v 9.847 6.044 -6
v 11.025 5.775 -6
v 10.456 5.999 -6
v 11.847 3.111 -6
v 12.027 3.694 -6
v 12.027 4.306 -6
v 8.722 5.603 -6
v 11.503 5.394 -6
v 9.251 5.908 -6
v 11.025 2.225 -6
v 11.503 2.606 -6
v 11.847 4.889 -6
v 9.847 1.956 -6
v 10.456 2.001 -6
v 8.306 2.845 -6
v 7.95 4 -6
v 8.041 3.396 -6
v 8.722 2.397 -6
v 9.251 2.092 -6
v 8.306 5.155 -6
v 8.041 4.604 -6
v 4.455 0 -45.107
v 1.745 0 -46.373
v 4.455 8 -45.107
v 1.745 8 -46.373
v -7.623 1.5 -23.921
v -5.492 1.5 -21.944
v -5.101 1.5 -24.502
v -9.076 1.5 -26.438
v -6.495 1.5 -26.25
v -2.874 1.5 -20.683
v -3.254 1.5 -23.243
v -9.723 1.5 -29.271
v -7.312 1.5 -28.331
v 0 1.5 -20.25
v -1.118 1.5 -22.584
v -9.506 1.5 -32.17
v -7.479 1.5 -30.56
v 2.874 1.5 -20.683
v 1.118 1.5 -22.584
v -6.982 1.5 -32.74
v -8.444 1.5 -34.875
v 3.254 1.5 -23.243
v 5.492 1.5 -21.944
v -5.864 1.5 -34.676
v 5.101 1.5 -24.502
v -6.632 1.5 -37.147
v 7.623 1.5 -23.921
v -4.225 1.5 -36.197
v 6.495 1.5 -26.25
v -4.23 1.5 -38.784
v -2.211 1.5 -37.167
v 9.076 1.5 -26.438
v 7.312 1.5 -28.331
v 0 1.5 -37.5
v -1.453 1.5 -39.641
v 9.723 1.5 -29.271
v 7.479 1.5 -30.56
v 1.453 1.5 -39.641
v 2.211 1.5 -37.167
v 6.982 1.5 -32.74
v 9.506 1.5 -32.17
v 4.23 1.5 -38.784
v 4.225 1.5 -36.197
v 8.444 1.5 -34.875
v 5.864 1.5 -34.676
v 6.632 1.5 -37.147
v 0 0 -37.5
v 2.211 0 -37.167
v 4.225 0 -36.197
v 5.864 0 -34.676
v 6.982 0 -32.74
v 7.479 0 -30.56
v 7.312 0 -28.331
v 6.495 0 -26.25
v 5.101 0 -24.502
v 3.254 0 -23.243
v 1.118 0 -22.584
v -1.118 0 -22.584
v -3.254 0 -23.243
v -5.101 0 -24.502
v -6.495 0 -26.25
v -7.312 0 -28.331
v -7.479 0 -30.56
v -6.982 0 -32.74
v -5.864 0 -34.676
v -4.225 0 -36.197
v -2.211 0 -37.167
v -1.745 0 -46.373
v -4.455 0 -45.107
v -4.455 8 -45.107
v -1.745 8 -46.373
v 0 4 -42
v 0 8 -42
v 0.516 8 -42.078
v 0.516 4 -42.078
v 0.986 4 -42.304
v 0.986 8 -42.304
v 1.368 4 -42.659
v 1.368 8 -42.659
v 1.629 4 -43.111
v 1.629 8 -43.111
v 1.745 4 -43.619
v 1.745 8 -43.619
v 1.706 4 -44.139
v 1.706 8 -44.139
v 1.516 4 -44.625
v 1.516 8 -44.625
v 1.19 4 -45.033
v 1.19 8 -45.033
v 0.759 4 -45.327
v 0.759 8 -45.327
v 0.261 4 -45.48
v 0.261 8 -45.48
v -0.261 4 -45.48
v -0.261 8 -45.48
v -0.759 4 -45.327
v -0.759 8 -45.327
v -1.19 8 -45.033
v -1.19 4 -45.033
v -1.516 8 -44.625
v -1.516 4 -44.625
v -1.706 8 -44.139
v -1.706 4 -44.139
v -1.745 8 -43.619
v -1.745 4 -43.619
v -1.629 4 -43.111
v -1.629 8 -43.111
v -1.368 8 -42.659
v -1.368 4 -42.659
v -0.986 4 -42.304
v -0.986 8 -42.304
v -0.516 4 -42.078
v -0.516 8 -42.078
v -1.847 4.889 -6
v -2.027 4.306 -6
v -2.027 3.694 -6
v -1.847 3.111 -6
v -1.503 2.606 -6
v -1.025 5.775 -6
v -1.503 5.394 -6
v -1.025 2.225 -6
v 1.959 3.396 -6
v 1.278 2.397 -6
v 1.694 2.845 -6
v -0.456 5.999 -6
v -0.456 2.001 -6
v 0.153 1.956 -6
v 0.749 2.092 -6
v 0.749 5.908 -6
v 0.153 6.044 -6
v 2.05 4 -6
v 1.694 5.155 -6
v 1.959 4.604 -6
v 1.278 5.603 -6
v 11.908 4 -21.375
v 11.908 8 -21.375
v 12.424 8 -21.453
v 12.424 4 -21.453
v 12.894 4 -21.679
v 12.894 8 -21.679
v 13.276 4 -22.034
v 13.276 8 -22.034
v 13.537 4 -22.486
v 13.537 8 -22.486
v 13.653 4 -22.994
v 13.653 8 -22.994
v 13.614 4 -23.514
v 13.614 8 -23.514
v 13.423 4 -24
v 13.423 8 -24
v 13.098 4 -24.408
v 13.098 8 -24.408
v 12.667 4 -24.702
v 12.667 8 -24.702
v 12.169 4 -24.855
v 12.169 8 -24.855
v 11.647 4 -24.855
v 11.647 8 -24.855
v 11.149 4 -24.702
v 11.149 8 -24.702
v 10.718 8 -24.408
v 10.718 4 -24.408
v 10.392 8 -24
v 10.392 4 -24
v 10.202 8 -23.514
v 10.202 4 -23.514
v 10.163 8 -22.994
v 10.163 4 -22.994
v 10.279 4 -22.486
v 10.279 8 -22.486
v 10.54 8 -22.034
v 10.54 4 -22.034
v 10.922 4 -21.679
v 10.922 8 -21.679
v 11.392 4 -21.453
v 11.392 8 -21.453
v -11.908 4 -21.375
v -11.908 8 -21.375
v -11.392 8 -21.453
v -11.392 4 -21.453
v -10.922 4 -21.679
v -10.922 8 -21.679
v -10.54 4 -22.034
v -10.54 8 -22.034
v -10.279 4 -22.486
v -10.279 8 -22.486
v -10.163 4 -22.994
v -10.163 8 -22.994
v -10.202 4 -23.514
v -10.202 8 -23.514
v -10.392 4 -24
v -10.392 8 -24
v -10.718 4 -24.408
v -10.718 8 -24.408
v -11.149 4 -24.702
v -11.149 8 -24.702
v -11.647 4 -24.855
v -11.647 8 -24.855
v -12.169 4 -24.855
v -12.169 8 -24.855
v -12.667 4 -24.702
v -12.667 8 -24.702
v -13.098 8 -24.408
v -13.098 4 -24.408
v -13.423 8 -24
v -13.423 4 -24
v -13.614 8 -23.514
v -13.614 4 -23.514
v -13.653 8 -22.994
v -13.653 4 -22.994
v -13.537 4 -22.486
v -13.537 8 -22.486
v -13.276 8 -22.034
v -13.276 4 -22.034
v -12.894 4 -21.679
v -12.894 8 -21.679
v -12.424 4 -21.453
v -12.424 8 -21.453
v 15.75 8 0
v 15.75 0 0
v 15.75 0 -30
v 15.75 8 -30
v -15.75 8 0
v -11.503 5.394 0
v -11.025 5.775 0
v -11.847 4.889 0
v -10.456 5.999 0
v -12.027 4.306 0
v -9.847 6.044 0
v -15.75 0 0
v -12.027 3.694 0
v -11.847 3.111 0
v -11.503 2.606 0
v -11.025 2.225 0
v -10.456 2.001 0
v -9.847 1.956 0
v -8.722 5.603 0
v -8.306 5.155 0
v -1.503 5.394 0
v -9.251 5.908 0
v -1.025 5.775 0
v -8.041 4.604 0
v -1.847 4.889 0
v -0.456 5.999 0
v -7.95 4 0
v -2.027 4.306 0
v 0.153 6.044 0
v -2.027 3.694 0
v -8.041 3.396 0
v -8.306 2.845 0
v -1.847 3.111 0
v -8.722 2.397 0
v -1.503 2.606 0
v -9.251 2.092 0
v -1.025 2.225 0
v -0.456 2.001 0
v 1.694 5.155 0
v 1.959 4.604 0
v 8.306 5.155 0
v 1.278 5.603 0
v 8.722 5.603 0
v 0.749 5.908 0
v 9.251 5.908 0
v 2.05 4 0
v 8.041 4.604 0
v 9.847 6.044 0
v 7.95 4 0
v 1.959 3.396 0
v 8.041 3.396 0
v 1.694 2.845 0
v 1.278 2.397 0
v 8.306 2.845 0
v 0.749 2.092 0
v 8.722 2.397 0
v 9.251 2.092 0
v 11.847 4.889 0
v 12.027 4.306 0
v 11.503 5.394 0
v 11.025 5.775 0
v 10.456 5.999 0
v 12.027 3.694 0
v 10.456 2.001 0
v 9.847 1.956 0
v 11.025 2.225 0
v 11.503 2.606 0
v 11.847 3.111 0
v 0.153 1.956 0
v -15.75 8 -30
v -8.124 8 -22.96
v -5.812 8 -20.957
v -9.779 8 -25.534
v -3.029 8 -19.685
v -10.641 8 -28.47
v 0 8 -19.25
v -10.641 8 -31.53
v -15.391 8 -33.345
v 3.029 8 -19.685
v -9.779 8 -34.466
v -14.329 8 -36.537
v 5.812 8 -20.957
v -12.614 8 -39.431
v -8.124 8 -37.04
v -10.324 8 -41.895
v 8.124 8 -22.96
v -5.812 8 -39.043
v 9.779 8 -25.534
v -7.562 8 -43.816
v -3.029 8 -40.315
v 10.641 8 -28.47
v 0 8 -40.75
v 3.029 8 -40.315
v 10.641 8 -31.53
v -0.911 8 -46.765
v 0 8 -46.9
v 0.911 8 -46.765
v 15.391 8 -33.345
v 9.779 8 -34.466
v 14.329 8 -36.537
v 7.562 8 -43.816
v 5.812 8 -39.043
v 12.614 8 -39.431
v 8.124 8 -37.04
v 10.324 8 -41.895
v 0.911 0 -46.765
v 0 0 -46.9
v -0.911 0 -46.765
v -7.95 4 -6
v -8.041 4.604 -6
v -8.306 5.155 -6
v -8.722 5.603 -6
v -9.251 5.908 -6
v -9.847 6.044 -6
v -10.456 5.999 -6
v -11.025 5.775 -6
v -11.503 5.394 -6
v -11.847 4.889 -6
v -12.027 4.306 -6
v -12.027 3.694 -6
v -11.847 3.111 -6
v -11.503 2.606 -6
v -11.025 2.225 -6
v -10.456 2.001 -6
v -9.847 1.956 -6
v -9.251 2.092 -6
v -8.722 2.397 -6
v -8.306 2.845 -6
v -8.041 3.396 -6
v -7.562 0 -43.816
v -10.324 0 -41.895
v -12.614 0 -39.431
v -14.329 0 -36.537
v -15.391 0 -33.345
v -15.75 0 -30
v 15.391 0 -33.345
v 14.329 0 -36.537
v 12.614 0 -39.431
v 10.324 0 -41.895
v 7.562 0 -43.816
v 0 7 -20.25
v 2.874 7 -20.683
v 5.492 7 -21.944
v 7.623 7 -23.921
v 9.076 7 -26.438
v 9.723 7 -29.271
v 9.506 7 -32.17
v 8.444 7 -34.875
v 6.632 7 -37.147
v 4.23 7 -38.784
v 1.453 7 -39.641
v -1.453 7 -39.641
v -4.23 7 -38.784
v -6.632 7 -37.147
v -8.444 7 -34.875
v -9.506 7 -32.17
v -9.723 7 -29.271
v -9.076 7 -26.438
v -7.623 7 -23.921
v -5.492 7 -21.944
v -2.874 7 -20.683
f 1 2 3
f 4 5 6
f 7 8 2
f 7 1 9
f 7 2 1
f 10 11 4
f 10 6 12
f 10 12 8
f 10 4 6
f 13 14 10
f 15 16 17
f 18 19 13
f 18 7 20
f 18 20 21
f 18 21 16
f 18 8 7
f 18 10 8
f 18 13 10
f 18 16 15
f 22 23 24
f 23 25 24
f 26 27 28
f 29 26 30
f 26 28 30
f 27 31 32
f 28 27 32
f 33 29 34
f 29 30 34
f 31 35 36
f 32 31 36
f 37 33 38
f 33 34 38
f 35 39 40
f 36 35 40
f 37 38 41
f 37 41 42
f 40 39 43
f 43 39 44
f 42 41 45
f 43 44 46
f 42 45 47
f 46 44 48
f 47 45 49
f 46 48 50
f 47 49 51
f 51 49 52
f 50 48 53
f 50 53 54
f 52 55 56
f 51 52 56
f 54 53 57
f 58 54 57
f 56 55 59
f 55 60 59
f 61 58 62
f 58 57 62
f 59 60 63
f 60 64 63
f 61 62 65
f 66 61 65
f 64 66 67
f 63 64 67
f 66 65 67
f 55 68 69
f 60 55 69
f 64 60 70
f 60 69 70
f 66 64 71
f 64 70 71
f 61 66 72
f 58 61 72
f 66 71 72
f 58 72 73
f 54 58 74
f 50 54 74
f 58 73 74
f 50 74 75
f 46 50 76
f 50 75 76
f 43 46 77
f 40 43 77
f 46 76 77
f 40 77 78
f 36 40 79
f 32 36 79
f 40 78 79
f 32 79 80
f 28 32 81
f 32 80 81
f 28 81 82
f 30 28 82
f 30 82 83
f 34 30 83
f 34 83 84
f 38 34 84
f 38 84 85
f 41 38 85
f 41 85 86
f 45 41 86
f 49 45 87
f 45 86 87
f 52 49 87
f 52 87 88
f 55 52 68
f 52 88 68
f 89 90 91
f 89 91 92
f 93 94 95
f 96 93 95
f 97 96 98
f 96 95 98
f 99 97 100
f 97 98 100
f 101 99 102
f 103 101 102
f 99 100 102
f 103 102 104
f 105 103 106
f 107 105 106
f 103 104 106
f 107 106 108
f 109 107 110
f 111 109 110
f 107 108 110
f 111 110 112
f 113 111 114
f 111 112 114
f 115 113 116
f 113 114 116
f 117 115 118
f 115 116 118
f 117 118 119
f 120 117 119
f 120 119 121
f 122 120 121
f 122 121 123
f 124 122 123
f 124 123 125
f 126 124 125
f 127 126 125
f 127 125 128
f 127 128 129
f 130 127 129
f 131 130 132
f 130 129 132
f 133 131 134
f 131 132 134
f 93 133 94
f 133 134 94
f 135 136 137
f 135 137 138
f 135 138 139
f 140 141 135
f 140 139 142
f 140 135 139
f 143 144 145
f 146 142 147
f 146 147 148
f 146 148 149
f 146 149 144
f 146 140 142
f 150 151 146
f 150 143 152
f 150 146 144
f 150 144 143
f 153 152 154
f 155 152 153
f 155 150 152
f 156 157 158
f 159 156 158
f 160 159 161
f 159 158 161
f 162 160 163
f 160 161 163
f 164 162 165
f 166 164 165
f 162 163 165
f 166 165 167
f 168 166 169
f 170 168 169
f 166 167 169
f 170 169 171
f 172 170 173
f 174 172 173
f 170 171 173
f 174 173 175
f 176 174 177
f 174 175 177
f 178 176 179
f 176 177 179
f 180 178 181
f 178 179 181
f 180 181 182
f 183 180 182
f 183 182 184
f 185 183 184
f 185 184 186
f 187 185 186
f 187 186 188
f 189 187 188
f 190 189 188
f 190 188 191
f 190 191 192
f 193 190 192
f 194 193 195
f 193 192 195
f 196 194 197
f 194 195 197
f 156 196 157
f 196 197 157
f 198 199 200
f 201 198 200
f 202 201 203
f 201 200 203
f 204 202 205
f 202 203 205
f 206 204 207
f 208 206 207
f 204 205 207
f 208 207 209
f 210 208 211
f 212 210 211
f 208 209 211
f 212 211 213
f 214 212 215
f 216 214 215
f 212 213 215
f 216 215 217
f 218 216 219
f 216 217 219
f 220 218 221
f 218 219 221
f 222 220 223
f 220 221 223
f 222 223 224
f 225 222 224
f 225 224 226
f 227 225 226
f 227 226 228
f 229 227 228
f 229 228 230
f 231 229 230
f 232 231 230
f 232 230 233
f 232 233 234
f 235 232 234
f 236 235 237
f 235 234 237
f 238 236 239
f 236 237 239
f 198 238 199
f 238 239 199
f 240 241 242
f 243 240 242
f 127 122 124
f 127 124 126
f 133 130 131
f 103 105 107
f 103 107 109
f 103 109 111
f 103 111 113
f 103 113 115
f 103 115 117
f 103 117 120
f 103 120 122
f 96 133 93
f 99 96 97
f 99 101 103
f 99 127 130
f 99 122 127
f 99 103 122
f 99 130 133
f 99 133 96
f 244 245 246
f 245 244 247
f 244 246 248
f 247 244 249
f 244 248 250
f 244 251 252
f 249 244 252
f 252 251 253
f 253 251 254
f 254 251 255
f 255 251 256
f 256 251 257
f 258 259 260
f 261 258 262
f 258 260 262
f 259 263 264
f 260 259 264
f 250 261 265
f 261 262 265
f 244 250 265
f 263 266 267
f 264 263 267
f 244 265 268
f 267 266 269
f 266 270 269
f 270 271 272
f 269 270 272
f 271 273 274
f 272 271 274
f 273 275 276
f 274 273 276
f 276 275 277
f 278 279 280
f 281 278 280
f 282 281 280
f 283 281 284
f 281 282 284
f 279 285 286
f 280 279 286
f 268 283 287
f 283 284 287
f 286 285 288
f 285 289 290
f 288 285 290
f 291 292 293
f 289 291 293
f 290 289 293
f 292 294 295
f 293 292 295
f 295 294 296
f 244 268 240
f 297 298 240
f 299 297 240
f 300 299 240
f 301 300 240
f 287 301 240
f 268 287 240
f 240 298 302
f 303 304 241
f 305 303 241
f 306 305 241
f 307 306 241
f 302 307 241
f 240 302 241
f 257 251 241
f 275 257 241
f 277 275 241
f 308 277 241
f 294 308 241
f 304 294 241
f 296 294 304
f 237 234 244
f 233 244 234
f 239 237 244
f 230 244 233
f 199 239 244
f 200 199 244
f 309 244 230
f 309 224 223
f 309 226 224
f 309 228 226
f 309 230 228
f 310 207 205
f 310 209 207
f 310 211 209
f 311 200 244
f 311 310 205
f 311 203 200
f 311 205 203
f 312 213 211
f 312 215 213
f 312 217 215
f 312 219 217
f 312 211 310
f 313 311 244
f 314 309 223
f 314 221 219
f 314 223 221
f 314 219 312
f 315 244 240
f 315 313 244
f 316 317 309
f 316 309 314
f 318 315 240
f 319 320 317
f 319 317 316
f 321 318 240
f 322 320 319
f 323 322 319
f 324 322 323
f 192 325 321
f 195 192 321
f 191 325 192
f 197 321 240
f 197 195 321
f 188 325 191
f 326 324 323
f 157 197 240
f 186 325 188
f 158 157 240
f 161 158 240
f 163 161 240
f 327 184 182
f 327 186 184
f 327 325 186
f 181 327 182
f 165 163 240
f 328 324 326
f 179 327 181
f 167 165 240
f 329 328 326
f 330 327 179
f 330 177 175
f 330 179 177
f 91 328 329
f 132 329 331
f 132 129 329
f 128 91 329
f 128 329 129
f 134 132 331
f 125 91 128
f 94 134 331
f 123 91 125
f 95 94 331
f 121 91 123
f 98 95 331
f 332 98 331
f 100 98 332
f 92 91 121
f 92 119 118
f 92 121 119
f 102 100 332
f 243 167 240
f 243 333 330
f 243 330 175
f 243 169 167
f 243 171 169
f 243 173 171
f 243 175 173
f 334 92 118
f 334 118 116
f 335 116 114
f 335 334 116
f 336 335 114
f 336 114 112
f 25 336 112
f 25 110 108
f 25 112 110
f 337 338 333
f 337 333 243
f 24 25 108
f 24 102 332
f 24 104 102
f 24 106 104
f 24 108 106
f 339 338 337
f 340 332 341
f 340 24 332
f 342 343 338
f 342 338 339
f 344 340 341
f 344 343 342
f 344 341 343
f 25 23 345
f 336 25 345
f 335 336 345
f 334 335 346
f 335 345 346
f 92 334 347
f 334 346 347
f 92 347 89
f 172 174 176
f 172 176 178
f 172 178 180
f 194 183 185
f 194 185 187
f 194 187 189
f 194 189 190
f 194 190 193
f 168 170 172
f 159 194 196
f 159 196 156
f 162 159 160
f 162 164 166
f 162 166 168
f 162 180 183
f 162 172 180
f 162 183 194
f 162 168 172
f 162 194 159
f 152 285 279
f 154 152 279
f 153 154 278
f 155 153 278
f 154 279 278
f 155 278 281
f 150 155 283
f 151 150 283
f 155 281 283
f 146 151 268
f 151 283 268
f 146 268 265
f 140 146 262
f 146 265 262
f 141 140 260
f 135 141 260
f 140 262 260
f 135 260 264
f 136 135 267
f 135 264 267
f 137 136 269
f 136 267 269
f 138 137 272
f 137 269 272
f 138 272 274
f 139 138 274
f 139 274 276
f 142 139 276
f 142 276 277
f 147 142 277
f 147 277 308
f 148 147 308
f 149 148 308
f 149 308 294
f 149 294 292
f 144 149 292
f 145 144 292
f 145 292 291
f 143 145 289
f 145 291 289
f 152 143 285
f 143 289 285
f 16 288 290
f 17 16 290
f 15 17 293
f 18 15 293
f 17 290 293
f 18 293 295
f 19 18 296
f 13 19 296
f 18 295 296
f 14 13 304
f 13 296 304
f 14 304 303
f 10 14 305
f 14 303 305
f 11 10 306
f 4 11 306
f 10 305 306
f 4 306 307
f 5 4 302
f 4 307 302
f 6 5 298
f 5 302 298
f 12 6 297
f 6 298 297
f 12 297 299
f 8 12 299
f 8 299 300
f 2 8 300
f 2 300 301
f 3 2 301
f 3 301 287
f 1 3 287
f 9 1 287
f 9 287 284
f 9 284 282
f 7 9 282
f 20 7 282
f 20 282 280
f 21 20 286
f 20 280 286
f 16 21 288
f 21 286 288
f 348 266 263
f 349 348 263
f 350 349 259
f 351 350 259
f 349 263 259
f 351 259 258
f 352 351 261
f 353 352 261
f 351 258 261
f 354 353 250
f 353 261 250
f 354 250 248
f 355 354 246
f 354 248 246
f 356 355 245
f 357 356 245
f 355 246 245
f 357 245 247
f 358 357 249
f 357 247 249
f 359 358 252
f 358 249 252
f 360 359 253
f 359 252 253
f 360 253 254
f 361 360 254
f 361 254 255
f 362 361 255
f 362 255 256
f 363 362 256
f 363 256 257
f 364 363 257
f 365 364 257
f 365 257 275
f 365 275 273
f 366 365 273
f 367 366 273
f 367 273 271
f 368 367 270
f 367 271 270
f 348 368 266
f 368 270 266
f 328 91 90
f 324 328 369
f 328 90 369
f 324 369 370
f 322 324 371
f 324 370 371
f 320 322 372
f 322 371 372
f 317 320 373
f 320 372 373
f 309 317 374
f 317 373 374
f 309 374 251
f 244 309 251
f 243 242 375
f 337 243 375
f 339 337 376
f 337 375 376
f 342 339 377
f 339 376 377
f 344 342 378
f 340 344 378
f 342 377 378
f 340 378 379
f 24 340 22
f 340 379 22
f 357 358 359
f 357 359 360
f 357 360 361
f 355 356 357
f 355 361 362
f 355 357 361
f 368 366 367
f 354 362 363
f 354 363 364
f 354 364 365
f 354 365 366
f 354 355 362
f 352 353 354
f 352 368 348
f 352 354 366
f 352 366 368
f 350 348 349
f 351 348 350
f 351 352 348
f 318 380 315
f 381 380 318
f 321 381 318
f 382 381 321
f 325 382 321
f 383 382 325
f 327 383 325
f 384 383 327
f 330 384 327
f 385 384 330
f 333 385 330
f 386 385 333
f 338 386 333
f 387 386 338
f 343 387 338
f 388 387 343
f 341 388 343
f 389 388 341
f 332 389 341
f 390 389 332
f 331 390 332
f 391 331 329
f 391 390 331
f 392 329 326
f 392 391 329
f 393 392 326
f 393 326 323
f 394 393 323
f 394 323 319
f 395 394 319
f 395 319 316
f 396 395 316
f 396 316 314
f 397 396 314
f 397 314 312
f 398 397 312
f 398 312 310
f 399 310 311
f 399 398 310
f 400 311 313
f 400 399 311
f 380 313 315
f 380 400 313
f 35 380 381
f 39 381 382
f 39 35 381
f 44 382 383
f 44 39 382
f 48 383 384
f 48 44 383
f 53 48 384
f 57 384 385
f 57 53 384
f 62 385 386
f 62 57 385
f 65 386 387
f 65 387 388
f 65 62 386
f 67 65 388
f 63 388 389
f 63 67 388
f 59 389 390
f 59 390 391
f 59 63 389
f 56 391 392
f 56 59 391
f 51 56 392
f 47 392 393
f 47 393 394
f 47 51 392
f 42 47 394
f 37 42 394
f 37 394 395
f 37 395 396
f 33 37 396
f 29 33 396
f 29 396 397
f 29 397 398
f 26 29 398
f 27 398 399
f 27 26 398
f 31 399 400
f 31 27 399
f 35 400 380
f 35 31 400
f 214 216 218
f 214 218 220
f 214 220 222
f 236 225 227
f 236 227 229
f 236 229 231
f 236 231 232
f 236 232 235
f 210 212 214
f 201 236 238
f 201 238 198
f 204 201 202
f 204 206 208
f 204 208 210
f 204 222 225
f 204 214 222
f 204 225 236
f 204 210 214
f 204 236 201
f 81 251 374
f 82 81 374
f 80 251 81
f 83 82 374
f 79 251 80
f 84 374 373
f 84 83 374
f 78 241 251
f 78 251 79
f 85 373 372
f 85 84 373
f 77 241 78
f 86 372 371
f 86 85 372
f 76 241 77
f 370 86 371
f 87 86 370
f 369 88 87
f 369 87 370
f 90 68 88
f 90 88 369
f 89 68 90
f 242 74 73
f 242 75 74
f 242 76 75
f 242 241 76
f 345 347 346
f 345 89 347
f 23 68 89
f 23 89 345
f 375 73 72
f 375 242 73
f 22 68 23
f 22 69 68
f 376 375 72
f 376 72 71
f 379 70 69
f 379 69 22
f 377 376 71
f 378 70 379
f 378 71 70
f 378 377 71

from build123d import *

# Parameters (mm, degrees)
SKETCH_1_R          = 9.75
EXTRUDE_1_DEPTH     = 8
SKETCH_2_R          = 2.05
CUT_EXTRUDE_1_DEPTH = 6
SKETCH_4_R          = 9.75
SKETCH_4_R_2        = 7.5
EXTRUDE_2_DEPTH     = 1.5
EXTRUDE_START       = -8
EXTRUDE_3_DEPTH     = 8
SKETCH_6_R          = 1.75
CUT_EXTRUDE_2_DEPTH = 4
FILLET_1_R          = 10
CHAMFER_1_SIZE      = 1


with BuildPart() as part:
    # Эскиз1 → Бобышка-Вытянуть1 (new body)
    with BuildSketch(Plane(origin=(0, 0, 0), x_dir=(1, 0, 0), z_dir=(0, 1, 0))):
        with BuildLine():
            Line((-15.75, 0), (15.75, 0))
            Line((15.75, 0), (15.75, 30))
            ThreePointArc((15.75, 30), (0, 45.75), (-15.75, 30))
            Line((-15.75, 30), (-15.75, 0))
        make_face()
        with Locations(Location((0, 30, 0), (0, 0, 270))):
            Circle(SKETCH_1_R, mode=Mode.SUBTRACT)
    extrude(amount=EXTRUDE_1_DEPTH)

    # Эскиз2 → Вырез-Вытянуть1 (cut)
    with BuildSketch(Plane.XY):
        with Locations((0, 4)):
            Circle(SKETCH_2_R)
        with Locations((-10, 4)):
            Circle(SKETCH_2_R)
        with Locations(Location((10, 4, 0), (0, 0, 180))):
            Circle(SKETCH_2_R)
    extrude(amount=-CUT_EXTRUDE_1_DEPTH, mode=Mode.SUBTRACT)

    # Эскиз4 → Бобышка-Вытянуть2 (add)
    with BuildSketch(Plane.XZ):
        with Locations(Location((0, -30, 0), (0, 0, 270))):
            Circle(SKETCH_4_R)
        with Locations(Location((0, -30, 0), (0, 0, 270))):
            Circle(SKETCH_4_R_2, mode=Mode.SUBTRACT)
    extrude(amount=-EXTRUDE_2_DEPTH)

    # Эскиз5 → Бобышка-Вытянуть3 (add)
    with BuildSketch(Plane(origin=(0, 8, 0), x_dir=(1, 0, 0), z_dir=(0, 1, 0)).offset(EXTRUDE_START)):
        with BuildLine():
            ThreePointArc((2.595683542, 45.534636364), (0, 46.9), (-2.595683542, 45.534636364))
            ThreePointArc((-2.595683542, 45.534636364), (0, 45.75), (2.595683542, 45.534636364))
        make_face()
    extrude(amount=EXTRUDE_3_DEPTH)

    # Эскиз6 → Вырез-Вытянуть2 (cut)
    with BuildSketch(Plane(origin=(0, 8, 0), x_dir=(1, 0, 0), z_dir=(0, 1, 0))):
        with Locations(Location((0, 43.75, 0), (0, 0, 270))):
            Circle(SKETCH_6_R)
        with Locations(Location((11.907849302, 23.125, 0), (0, 0, 270))):
            Circle(SKETCH_6_R)
        with Locations(Location((-11.907849302, 23.125, 0), (0, 0, 270))):
            Circle(SKETCH_6_R)
    extrude(amount=-CUT_EXTRUDE_2_DEPTH, mode=Mode.SUBTRACT)

    # Скругление1
    fillet_1_edges = [part.edges().sort_by_distance(p)[0] for p in [
        (2.595683542, 4, -45.534636364),
        (-2.595683542, 4, -45.534636364),
    ]]
    fillet(fillet_1_edges, radius=FILLET_1_R)

    # Фаска1
    chamfer_1_edges = [part.edges().sort_by_distance(p)[0] for p in [
        (0, 8, -39.75),
    ]]
    chamfer(chamfer_1_edges, length=CHAMFER_1_SIZE)


solid = part.part
